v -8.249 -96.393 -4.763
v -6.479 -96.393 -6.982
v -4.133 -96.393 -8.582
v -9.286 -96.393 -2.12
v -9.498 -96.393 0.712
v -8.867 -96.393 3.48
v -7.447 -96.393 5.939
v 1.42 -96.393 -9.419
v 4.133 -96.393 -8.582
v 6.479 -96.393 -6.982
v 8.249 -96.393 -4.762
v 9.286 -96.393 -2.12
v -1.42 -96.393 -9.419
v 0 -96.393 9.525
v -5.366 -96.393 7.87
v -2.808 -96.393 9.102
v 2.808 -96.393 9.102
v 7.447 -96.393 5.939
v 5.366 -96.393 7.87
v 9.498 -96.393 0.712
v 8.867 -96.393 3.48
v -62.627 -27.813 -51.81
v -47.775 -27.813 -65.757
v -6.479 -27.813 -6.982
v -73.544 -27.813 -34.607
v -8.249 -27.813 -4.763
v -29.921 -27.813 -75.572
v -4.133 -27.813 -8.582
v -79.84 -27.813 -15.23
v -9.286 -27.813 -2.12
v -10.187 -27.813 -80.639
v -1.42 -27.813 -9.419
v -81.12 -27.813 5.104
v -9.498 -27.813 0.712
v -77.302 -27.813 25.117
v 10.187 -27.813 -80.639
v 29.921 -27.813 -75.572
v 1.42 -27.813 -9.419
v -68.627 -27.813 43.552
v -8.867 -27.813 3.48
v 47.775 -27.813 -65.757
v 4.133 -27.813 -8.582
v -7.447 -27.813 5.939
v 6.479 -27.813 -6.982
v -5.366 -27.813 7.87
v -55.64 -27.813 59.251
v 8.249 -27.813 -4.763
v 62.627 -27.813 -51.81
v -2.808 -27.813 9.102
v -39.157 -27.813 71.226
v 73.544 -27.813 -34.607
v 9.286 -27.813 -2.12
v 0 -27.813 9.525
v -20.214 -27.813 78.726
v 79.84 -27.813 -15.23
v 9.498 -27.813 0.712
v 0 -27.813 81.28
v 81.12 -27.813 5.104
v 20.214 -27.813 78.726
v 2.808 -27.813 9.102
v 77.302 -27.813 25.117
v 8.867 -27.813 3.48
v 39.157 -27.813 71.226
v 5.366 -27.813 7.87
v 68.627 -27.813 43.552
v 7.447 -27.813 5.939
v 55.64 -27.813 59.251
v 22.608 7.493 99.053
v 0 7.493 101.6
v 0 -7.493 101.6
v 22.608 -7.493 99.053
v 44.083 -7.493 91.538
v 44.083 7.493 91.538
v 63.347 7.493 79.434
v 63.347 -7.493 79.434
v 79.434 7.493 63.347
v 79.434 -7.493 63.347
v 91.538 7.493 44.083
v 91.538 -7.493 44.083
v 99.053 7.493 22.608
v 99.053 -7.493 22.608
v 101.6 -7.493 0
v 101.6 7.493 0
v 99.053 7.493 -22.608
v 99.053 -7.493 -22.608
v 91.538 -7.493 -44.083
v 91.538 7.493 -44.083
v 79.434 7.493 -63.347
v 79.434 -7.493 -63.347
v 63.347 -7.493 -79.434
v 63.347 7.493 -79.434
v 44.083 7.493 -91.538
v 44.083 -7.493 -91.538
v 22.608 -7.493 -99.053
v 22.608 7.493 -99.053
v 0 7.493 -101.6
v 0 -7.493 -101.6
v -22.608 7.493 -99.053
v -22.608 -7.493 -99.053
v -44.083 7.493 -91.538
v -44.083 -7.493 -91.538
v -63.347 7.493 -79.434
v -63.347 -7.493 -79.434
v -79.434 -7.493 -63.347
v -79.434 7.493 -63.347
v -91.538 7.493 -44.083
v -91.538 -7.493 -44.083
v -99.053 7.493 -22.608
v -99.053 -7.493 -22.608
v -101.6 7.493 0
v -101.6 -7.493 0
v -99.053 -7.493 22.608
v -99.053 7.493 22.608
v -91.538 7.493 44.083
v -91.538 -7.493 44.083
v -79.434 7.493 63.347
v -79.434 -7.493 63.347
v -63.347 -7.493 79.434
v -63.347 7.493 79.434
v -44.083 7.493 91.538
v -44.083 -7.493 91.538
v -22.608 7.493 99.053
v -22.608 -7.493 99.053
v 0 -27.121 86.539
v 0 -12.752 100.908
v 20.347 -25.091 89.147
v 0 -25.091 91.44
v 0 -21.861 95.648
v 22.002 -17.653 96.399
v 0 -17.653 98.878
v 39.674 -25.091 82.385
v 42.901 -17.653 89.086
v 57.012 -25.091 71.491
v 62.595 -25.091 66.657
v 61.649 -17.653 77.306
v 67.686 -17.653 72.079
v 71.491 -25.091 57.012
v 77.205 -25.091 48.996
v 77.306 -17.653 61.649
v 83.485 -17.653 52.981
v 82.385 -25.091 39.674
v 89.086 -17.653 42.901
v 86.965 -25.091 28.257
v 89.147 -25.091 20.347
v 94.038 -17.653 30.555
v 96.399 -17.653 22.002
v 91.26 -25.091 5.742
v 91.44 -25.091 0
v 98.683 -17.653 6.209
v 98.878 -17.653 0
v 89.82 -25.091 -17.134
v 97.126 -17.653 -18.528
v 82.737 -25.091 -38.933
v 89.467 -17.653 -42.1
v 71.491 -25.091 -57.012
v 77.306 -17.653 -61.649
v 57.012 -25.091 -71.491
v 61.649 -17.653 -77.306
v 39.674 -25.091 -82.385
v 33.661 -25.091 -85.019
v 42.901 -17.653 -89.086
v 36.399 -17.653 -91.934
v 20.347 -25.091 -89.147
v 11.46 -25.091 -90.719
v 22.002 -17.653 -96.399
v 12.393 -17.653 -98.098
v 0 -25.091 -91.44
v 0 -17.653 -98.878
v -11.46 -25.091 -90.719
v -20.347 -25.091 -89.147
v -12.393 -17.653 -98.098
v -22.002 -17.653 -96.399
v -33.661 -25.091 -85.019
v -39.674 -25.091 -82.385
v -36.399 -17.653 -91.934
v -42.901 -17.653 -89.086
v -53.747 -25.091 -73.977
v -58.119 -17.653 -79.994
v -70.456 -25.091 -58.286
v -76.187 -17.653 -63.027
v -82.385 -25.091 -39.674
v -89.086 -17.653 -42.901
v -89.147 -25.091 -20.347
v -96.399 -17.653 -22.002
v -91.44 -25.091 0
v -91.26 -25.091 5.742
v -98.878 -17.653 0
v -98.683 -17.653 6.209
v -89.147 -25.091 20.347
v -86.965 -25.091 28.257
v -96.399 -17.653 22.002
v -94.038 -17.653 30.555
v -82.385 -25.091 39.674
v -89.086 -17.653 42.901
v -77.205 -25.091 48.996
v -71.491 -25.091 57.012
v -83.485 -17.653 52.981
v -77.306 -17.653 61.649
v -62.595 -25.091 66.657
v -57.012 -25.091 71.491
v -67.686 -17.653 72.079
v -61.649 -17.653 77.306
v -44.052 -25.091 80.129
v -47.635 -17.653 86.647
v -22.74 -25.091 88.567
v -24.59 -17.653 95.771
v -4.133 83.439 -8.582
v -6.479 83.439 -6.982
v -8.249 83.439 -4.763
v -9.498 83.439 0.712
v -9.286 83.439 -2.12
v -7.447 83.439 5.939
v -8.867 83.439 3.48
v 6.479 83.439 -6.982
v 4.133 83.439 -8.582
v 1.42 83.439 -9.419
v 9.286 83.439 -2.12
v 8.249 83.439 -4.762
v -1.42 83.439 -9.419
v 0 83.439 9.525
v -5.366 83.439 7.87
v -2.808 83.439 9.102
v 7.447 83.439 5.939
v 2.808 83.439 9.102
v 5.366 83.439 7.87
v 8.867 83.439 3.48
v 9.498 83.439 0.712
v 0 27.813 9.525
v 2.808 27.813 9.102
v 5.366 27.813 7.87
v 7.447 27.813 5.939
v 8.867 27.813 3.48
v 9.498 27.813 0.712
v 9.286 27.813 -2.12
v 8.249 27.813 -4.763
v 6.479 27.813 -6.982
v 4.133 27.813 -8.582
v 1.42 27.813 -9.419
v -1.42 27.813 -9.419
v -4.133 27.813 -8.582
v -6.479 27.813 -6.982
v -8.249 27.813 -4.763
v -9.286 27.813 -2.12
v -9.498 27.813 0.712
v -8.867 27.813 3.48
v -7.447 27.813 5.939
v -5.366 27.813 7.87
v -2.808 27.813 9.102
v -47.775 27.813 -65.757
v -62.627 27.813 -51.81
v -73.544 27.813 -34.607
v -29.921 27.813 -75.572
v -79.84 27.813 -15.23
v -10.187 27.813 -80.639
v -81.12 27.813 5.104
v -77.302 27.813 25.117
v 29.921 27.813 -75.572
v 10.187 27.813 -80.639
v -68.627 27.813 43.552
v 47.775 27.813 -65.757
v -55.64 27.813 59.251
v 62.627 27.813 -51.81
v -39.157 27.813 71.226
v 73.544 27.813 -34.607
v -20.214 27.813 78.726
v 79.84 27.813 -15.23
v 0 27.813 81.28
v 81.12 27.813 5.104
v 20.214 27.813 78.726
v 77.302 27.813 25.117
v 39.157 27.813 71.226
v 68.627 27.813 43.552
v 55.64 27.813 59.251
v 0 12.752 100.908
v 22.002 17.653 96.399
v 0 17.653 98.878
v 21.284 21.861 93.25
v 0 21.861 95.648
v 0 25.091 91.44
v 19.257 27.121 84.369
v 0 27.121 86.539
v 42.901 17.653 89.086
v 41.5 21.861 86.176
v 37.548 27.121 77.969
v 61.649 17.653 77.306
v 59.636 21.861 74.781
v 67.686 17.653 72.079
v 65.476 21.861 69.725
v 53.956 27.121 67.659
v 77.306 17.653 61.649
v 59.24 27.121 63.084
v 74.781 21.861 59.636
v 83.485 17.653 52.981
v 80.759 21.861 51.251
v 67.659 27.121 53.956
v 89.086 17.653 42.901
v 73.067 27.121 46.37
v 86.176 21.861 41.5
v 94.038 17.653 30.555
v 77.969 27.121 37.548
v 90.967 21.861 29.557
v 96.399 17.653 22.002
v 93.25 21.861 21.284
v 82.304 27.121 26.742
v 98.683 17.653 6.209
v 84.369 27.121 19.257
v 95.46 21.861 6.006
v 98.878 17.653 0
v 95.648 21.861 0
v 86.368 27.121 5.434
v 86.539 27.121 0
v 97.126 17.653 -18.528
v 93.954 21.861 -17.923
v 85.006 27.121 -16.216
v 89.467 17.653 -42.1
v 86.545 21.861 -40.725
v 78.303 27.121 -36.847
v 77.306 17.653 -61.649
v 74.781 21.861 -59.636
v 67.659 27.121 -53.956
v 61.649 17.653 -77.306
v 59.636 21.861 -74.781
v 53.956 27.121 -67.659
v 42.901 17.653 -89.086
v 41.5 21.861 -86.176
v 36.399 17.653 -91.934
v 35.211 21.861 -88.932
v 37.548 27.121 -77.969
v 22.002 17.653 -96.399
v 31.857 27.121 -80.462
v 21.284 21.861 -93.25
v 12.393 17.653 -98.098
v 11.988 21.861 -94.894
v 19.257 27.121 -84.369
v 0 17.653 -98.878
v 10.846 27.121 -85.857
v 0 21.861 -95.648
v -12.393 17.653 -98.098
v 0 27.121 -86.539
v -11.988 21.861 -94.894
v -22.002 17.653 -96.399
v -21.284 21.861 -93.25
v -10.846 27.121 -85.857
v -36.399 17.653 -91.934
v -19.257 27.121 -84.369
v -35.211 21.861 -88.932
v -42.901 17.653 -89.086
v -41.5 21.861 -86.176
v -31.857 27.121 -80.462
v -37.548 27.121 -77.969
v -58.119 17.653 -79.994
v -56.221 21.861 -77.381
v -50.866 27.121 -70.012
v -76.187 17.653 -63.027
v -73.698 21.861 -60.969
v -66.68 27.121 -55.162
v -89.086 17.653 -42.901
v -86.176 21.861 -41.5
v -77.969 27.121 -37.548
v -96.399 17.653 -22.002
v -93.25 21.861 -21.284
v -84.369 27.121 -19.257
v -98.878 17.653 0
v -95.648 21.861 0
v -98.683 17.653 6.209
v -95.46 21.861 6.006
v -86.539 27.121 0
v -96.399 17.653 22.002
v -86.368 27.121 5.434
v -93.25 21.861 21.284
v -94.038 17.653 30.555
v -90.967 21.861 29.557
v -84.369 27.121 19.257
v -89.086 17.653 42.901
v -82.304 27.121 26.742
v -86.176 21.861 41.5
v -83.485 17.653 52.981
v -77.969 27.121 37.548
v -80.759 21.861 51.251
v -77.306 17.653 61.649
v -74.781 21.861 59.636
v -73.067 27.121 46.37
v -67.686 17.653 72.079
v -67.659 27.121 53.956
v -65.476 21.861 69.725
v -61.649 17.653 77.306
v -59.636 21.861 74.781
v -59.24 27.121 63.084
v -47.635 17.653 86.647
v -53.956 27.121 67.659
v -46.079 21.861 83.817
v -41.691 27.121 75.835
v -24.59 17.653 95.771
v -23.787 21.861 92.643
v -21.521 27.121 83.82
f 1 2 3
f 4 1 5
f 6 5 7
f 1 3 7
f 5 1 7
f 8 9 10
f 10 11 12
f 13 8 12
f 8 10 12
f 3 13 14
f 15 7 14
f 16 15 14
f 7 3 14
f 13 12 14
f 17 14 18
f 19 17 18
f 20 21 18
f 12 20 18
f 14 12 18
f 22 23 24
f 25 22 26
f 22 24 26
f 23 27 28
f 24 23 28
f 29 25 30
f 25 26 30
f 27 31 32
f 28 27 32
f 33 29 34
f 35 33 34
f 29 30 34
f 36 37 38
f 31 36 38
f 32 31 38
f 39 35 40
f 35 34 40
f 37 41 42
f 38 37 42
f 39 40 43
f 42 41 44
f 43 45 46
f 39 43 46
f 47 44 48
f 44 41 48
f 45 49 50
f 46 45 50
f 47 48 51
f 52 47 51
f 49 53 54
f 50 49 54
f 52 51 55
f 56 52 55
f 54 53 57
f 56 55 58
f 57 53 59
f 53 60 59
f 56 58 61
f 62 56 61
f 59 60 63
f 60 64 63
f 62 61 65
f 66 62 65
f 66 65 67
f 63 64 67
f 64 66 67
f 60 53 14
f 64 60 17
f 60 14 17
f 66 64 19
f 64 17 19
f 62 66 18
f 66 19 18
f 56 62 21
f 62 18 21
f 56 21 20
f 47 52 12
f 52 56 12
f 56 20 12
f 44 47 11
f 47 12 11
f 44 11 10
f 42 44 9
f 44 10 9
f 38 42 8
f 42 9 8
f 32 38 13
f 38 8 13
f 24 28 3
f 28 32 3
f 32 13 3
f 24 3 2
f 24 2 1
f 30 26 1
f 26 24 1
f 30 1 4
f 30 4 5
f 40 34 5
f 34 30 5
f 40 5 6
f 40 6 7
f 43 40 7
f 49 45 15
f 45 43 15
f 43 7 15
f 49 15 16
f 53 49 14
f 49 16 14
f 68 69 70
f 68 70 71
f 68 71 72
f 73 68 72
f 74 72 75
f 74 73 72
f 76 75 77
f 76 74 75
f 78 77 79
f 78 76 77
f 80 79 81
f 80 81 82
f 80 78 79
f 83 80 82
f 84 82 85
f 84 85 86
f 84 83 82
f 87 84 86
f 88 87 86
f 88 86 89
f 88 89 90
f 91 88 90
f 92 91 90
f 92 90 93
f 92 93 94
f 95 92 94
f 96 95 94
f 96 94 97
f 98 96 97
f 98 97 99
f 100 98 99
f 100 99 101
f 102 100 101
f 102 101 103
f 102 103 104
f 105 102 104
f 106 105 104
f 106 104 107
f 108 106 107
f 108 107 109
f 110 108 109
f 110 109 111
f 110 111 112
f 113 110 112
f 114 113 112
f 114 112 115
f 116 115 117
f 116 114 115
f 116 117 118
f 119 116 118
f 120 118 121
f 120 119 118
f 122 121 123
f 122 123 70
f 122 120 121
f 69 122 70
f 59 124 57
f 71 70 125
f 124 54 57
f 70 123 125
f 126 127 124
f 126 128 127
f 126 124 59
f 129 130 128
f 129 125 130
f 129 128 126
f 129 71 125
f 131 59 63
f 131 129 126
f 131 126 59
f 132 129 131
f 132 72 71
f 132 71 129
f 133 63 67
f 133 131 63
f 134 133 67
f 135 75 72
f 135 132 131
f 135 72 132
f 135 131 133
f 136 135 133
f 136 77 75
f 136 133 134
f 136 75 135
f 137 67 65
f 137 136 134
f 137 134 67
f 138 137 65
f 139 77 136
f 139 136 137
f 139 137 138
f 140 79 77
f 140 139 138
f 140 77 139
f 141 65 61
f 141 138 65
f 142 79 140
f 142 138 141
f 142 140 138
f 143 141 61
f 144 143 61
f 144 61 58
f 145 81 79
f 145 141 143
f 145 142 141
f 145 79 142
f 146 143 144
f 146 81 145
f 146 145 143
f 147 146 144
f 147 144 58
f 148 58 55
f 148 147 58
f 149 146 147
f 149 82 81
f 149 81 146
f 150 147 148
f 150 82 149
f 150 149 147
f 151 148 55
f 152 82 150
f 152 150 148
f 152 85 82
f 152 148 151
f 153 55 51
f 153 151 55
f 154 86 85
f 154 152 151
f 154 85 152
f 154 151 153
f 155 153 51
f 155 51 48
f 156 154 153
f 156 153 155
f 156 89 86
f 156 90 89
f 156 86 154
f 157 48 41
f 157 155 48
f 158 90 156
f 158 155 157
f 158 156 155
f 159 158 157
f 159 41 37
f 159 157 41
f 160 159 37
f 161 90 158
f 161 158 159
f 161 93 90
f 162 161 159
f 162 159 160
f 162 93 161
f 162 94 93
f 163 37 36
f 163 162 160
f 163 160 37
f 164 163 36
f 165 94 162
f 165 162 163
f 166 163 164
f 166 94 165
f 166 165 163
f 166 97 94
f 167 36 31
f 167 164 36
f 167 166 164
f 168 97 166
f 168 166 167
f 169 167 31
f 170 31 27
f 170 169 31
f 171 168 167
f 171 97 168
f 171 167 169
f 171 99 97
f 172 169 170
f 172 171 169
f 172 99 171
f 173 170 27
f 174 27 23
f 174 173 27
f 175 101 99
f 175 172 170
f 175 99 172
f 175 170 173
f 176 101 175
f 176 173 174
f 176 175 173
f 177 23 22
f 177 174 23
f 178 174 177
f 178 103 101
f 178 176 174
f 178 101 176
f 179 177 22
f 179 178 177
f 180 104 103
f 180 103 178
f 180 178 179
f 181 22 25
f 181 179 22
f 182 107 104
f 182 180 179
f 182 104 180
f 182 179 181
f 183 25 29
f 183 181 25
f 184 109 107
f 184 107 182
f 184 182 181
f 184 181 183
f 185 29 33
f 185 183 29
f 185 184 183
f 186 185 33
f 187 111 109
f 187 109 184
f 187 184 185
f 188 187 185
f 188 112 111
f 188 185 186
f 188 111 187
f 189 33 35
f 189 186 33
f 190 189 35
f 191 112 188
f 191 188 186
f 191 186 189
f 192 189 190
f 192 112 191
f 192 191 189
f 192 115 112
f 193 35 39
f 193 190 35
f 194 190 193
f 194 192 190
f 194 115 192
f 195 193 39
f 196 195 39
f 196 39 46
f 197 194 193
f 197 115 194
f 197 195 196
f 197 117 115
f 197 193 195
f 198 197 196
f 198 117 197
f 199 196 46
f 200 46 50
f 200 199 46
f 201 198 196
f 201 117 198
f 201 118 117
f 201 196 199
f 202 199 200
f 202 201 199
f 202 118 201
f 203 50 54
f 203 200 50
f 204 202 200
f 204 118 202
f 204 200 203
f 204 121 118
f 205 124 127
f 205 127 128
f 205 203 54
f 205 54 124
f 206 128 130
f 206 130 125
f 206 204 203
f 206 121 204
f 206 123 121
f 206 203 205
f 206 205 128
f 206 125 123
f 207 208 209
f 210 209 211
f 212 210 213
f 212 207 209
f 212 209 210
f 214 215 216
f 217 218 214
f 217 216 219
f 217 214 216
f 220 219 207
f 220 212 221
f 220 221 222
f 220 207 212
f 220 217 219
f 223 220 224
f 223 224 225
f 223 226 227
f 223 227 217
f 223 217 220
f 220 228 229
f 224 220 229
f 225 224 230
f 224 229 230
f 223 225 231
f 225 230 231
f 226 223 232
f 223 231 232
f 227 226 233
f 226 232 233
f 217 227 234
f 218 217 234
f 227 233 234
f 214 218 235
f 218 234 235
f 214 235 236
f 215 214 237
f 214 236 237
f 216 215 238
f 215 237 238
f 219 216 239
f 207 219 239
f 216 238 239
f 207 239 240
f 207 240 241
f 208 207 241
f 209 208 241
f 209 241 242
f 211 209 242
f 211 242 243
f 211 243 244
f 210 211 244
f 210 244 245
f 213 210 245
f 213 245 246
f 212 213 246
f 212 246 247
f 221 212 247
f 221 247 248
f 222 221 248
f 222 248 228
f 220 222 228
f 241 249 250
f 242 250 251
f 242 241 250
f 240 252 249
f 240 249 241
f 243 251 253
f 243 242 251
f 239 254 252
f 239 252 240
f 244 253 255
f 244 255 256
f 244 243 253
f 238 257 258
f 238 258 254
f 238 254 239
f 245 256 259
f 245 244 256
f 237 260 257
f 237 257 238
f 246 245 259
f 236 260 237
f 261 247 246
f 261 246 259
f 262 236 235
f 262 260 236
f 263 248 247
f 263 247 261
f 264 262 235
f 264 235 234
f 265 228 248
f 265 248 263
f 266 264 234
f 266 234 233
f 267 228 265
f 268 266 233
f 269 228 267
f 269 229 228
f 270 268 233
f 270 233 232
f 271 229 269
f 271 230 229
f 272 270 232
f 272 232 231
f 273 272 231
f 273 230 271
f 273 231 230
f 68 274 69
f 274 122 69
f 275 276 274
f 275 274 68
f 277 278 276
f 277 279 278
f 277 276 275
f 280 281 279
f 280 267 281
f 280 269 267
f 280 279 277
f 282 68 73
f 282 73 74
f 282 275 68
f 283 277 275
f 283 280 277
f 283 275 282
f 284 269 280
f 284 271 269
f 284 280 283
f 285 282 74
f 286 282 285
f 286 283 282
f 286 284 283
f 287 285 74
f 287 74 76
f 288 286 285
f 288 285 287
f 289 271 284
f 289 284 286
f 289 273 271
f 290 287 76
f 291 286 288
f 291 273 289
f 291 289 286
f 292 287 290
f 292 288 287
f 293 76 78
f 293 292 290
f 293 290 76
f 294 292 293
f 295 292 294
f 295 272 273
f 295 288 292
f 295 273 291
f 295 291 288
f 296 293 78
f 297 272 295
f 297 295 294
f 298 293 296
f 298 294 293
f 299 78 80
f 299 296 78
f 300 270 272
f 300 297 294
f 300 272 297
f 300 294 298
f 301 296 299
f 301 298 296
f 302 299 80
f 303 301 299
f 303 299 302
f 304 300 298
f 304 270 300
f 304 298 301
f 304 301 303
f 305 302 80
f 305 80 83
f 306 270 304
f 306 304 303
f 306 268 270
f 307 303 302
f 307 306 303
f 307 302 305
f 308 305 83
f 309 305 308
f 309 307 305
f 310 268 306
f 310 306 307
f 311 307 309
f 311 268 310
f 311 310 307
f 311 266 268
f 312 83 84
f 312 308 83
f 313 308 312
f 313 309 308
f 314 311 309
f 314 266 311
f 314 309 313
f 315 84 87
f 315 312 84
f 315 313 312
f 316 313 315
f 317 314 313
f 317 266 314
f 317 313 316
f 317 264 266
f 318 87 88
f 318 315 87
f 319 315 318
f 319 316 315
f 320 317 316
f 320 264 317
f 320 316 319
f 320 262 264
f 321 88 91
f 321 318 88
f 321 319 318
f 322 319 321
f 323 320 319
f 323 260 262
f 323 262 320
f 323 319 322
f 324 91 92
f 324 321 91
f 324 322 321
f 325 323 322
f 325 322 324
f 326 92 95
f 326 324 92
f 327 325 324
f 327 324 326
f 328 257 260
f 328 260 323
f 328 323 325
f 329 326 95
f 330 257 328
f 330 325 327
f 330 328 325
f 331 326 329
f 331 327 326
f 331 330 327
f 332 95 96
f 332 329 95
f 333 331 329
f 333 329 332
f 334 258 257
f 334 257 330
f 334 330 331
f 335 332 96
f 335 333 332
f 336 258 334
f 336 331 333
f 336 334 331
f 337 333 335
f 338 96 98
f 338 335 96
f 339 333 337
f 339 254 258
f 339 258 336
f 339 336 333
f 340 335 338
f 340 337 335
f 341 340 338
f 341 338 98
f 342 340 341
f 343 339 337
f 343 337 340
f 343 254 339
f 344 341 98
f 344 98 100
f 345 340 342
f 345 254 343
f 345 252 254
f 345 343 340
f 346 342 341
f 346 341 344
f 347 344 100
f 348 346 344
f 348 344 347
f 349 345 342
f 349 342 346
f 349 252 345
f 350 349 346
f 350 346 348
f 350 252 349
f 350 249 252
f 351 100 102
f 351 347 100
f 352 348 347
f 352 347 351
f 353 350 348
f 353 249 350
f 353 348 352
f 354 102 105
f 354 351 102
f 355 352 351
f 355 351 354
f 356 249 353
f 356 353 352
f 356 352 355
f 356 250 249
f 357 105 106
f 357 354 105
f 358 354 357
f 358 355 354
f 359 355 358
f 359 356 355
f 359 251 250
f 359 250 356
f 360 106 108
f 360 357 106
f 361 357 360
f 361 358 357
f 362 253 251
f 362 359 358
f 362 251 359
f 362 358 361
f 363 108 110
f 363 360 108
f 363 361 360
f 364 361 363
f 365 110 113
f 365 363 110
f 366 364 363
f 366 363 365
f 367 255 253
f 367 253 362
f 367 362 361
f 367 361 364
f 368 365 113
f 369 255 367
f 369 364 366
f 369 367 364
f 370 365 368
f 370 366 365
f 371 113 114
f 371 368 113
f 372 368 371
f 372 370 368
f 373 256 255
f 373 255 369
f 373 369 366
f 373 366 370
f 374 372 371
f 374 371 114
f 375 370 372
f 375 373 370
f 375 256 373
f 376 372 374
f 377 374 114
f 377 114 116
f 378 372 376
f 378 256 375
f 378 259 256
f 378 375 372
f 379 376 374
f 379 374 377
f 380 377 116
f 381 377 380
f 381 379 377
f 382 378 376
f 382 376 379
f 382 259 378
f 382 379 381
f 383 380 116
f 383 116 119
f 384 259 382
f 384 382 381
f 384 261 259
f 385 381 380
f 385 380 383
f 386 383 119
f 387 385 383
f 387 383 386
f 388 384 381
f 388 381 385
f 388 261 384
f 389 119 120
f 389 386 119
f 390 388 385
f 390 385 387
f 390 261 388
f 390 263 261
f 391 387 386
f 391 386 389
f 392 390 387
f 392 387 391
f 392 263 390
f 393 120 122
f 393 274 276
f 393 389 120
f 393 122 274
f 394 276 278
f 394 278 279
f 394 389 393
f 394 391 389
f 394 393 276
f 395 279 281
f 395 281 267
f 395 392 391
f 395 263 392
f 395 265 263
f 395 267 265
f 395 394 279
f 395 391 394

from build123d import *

# Parameters (mm, degrees)
SKETCH1_R                = 101.6
BOSS_EXTRUDE1_DEPTH      = 27.813
BOSS_EXTRUDE2_DEPTH      = 55.626
BOSS_EXTRUDE2_DEPTH_BACK = 124.206
SKETCH2_R                = 9.525
FILLET1_R                = 20.32


with BuildPart() as part:
    # Sketch1 → Boss-Extrude1 (new, symmetric)
    with BuildSketch(Plane(origin=(0, 0, 0), x_dir=(1, 0, 0), z_dir=(0, 1, 0))):
        with Locations(Location((0, 0, 0), (0, 0, 270))):
            Circle(SKETCH1_R)
    extrude(amount=BOSS_EXTRUDE1_DEPTH, both=True)

    # Sketch2 → Boss-Extrude2 (add, two sides: drawn at the far end of the back side and taken through both)
    with BuildSketch(Plane(origin=(0, 27.813, 0), x_dir=(1, 0, 0), z_dir=(0, 1, 0)).offset(-BOSS_EXTRUDE2_DEPTH_BACK)):
        with Locations(Location((0, 0, 0), (0, 0, 270))):
            Circle(SKETCH2_R)
    extrude(amount=BOSS_EXTRUDE2_DEPTH + BOSS_EXTRUDE2_DEPTH_BACK)

    # Fillet1
    fillet1_edges = [part.edges().sort_by_distance(p)[0] for p in [
        (0, -27.813, -101.6),
        (0, 27.813, -101.6),
    ]]
    fillet(fillet1_edges, radius=FILLET1_R)


solid = part.part
